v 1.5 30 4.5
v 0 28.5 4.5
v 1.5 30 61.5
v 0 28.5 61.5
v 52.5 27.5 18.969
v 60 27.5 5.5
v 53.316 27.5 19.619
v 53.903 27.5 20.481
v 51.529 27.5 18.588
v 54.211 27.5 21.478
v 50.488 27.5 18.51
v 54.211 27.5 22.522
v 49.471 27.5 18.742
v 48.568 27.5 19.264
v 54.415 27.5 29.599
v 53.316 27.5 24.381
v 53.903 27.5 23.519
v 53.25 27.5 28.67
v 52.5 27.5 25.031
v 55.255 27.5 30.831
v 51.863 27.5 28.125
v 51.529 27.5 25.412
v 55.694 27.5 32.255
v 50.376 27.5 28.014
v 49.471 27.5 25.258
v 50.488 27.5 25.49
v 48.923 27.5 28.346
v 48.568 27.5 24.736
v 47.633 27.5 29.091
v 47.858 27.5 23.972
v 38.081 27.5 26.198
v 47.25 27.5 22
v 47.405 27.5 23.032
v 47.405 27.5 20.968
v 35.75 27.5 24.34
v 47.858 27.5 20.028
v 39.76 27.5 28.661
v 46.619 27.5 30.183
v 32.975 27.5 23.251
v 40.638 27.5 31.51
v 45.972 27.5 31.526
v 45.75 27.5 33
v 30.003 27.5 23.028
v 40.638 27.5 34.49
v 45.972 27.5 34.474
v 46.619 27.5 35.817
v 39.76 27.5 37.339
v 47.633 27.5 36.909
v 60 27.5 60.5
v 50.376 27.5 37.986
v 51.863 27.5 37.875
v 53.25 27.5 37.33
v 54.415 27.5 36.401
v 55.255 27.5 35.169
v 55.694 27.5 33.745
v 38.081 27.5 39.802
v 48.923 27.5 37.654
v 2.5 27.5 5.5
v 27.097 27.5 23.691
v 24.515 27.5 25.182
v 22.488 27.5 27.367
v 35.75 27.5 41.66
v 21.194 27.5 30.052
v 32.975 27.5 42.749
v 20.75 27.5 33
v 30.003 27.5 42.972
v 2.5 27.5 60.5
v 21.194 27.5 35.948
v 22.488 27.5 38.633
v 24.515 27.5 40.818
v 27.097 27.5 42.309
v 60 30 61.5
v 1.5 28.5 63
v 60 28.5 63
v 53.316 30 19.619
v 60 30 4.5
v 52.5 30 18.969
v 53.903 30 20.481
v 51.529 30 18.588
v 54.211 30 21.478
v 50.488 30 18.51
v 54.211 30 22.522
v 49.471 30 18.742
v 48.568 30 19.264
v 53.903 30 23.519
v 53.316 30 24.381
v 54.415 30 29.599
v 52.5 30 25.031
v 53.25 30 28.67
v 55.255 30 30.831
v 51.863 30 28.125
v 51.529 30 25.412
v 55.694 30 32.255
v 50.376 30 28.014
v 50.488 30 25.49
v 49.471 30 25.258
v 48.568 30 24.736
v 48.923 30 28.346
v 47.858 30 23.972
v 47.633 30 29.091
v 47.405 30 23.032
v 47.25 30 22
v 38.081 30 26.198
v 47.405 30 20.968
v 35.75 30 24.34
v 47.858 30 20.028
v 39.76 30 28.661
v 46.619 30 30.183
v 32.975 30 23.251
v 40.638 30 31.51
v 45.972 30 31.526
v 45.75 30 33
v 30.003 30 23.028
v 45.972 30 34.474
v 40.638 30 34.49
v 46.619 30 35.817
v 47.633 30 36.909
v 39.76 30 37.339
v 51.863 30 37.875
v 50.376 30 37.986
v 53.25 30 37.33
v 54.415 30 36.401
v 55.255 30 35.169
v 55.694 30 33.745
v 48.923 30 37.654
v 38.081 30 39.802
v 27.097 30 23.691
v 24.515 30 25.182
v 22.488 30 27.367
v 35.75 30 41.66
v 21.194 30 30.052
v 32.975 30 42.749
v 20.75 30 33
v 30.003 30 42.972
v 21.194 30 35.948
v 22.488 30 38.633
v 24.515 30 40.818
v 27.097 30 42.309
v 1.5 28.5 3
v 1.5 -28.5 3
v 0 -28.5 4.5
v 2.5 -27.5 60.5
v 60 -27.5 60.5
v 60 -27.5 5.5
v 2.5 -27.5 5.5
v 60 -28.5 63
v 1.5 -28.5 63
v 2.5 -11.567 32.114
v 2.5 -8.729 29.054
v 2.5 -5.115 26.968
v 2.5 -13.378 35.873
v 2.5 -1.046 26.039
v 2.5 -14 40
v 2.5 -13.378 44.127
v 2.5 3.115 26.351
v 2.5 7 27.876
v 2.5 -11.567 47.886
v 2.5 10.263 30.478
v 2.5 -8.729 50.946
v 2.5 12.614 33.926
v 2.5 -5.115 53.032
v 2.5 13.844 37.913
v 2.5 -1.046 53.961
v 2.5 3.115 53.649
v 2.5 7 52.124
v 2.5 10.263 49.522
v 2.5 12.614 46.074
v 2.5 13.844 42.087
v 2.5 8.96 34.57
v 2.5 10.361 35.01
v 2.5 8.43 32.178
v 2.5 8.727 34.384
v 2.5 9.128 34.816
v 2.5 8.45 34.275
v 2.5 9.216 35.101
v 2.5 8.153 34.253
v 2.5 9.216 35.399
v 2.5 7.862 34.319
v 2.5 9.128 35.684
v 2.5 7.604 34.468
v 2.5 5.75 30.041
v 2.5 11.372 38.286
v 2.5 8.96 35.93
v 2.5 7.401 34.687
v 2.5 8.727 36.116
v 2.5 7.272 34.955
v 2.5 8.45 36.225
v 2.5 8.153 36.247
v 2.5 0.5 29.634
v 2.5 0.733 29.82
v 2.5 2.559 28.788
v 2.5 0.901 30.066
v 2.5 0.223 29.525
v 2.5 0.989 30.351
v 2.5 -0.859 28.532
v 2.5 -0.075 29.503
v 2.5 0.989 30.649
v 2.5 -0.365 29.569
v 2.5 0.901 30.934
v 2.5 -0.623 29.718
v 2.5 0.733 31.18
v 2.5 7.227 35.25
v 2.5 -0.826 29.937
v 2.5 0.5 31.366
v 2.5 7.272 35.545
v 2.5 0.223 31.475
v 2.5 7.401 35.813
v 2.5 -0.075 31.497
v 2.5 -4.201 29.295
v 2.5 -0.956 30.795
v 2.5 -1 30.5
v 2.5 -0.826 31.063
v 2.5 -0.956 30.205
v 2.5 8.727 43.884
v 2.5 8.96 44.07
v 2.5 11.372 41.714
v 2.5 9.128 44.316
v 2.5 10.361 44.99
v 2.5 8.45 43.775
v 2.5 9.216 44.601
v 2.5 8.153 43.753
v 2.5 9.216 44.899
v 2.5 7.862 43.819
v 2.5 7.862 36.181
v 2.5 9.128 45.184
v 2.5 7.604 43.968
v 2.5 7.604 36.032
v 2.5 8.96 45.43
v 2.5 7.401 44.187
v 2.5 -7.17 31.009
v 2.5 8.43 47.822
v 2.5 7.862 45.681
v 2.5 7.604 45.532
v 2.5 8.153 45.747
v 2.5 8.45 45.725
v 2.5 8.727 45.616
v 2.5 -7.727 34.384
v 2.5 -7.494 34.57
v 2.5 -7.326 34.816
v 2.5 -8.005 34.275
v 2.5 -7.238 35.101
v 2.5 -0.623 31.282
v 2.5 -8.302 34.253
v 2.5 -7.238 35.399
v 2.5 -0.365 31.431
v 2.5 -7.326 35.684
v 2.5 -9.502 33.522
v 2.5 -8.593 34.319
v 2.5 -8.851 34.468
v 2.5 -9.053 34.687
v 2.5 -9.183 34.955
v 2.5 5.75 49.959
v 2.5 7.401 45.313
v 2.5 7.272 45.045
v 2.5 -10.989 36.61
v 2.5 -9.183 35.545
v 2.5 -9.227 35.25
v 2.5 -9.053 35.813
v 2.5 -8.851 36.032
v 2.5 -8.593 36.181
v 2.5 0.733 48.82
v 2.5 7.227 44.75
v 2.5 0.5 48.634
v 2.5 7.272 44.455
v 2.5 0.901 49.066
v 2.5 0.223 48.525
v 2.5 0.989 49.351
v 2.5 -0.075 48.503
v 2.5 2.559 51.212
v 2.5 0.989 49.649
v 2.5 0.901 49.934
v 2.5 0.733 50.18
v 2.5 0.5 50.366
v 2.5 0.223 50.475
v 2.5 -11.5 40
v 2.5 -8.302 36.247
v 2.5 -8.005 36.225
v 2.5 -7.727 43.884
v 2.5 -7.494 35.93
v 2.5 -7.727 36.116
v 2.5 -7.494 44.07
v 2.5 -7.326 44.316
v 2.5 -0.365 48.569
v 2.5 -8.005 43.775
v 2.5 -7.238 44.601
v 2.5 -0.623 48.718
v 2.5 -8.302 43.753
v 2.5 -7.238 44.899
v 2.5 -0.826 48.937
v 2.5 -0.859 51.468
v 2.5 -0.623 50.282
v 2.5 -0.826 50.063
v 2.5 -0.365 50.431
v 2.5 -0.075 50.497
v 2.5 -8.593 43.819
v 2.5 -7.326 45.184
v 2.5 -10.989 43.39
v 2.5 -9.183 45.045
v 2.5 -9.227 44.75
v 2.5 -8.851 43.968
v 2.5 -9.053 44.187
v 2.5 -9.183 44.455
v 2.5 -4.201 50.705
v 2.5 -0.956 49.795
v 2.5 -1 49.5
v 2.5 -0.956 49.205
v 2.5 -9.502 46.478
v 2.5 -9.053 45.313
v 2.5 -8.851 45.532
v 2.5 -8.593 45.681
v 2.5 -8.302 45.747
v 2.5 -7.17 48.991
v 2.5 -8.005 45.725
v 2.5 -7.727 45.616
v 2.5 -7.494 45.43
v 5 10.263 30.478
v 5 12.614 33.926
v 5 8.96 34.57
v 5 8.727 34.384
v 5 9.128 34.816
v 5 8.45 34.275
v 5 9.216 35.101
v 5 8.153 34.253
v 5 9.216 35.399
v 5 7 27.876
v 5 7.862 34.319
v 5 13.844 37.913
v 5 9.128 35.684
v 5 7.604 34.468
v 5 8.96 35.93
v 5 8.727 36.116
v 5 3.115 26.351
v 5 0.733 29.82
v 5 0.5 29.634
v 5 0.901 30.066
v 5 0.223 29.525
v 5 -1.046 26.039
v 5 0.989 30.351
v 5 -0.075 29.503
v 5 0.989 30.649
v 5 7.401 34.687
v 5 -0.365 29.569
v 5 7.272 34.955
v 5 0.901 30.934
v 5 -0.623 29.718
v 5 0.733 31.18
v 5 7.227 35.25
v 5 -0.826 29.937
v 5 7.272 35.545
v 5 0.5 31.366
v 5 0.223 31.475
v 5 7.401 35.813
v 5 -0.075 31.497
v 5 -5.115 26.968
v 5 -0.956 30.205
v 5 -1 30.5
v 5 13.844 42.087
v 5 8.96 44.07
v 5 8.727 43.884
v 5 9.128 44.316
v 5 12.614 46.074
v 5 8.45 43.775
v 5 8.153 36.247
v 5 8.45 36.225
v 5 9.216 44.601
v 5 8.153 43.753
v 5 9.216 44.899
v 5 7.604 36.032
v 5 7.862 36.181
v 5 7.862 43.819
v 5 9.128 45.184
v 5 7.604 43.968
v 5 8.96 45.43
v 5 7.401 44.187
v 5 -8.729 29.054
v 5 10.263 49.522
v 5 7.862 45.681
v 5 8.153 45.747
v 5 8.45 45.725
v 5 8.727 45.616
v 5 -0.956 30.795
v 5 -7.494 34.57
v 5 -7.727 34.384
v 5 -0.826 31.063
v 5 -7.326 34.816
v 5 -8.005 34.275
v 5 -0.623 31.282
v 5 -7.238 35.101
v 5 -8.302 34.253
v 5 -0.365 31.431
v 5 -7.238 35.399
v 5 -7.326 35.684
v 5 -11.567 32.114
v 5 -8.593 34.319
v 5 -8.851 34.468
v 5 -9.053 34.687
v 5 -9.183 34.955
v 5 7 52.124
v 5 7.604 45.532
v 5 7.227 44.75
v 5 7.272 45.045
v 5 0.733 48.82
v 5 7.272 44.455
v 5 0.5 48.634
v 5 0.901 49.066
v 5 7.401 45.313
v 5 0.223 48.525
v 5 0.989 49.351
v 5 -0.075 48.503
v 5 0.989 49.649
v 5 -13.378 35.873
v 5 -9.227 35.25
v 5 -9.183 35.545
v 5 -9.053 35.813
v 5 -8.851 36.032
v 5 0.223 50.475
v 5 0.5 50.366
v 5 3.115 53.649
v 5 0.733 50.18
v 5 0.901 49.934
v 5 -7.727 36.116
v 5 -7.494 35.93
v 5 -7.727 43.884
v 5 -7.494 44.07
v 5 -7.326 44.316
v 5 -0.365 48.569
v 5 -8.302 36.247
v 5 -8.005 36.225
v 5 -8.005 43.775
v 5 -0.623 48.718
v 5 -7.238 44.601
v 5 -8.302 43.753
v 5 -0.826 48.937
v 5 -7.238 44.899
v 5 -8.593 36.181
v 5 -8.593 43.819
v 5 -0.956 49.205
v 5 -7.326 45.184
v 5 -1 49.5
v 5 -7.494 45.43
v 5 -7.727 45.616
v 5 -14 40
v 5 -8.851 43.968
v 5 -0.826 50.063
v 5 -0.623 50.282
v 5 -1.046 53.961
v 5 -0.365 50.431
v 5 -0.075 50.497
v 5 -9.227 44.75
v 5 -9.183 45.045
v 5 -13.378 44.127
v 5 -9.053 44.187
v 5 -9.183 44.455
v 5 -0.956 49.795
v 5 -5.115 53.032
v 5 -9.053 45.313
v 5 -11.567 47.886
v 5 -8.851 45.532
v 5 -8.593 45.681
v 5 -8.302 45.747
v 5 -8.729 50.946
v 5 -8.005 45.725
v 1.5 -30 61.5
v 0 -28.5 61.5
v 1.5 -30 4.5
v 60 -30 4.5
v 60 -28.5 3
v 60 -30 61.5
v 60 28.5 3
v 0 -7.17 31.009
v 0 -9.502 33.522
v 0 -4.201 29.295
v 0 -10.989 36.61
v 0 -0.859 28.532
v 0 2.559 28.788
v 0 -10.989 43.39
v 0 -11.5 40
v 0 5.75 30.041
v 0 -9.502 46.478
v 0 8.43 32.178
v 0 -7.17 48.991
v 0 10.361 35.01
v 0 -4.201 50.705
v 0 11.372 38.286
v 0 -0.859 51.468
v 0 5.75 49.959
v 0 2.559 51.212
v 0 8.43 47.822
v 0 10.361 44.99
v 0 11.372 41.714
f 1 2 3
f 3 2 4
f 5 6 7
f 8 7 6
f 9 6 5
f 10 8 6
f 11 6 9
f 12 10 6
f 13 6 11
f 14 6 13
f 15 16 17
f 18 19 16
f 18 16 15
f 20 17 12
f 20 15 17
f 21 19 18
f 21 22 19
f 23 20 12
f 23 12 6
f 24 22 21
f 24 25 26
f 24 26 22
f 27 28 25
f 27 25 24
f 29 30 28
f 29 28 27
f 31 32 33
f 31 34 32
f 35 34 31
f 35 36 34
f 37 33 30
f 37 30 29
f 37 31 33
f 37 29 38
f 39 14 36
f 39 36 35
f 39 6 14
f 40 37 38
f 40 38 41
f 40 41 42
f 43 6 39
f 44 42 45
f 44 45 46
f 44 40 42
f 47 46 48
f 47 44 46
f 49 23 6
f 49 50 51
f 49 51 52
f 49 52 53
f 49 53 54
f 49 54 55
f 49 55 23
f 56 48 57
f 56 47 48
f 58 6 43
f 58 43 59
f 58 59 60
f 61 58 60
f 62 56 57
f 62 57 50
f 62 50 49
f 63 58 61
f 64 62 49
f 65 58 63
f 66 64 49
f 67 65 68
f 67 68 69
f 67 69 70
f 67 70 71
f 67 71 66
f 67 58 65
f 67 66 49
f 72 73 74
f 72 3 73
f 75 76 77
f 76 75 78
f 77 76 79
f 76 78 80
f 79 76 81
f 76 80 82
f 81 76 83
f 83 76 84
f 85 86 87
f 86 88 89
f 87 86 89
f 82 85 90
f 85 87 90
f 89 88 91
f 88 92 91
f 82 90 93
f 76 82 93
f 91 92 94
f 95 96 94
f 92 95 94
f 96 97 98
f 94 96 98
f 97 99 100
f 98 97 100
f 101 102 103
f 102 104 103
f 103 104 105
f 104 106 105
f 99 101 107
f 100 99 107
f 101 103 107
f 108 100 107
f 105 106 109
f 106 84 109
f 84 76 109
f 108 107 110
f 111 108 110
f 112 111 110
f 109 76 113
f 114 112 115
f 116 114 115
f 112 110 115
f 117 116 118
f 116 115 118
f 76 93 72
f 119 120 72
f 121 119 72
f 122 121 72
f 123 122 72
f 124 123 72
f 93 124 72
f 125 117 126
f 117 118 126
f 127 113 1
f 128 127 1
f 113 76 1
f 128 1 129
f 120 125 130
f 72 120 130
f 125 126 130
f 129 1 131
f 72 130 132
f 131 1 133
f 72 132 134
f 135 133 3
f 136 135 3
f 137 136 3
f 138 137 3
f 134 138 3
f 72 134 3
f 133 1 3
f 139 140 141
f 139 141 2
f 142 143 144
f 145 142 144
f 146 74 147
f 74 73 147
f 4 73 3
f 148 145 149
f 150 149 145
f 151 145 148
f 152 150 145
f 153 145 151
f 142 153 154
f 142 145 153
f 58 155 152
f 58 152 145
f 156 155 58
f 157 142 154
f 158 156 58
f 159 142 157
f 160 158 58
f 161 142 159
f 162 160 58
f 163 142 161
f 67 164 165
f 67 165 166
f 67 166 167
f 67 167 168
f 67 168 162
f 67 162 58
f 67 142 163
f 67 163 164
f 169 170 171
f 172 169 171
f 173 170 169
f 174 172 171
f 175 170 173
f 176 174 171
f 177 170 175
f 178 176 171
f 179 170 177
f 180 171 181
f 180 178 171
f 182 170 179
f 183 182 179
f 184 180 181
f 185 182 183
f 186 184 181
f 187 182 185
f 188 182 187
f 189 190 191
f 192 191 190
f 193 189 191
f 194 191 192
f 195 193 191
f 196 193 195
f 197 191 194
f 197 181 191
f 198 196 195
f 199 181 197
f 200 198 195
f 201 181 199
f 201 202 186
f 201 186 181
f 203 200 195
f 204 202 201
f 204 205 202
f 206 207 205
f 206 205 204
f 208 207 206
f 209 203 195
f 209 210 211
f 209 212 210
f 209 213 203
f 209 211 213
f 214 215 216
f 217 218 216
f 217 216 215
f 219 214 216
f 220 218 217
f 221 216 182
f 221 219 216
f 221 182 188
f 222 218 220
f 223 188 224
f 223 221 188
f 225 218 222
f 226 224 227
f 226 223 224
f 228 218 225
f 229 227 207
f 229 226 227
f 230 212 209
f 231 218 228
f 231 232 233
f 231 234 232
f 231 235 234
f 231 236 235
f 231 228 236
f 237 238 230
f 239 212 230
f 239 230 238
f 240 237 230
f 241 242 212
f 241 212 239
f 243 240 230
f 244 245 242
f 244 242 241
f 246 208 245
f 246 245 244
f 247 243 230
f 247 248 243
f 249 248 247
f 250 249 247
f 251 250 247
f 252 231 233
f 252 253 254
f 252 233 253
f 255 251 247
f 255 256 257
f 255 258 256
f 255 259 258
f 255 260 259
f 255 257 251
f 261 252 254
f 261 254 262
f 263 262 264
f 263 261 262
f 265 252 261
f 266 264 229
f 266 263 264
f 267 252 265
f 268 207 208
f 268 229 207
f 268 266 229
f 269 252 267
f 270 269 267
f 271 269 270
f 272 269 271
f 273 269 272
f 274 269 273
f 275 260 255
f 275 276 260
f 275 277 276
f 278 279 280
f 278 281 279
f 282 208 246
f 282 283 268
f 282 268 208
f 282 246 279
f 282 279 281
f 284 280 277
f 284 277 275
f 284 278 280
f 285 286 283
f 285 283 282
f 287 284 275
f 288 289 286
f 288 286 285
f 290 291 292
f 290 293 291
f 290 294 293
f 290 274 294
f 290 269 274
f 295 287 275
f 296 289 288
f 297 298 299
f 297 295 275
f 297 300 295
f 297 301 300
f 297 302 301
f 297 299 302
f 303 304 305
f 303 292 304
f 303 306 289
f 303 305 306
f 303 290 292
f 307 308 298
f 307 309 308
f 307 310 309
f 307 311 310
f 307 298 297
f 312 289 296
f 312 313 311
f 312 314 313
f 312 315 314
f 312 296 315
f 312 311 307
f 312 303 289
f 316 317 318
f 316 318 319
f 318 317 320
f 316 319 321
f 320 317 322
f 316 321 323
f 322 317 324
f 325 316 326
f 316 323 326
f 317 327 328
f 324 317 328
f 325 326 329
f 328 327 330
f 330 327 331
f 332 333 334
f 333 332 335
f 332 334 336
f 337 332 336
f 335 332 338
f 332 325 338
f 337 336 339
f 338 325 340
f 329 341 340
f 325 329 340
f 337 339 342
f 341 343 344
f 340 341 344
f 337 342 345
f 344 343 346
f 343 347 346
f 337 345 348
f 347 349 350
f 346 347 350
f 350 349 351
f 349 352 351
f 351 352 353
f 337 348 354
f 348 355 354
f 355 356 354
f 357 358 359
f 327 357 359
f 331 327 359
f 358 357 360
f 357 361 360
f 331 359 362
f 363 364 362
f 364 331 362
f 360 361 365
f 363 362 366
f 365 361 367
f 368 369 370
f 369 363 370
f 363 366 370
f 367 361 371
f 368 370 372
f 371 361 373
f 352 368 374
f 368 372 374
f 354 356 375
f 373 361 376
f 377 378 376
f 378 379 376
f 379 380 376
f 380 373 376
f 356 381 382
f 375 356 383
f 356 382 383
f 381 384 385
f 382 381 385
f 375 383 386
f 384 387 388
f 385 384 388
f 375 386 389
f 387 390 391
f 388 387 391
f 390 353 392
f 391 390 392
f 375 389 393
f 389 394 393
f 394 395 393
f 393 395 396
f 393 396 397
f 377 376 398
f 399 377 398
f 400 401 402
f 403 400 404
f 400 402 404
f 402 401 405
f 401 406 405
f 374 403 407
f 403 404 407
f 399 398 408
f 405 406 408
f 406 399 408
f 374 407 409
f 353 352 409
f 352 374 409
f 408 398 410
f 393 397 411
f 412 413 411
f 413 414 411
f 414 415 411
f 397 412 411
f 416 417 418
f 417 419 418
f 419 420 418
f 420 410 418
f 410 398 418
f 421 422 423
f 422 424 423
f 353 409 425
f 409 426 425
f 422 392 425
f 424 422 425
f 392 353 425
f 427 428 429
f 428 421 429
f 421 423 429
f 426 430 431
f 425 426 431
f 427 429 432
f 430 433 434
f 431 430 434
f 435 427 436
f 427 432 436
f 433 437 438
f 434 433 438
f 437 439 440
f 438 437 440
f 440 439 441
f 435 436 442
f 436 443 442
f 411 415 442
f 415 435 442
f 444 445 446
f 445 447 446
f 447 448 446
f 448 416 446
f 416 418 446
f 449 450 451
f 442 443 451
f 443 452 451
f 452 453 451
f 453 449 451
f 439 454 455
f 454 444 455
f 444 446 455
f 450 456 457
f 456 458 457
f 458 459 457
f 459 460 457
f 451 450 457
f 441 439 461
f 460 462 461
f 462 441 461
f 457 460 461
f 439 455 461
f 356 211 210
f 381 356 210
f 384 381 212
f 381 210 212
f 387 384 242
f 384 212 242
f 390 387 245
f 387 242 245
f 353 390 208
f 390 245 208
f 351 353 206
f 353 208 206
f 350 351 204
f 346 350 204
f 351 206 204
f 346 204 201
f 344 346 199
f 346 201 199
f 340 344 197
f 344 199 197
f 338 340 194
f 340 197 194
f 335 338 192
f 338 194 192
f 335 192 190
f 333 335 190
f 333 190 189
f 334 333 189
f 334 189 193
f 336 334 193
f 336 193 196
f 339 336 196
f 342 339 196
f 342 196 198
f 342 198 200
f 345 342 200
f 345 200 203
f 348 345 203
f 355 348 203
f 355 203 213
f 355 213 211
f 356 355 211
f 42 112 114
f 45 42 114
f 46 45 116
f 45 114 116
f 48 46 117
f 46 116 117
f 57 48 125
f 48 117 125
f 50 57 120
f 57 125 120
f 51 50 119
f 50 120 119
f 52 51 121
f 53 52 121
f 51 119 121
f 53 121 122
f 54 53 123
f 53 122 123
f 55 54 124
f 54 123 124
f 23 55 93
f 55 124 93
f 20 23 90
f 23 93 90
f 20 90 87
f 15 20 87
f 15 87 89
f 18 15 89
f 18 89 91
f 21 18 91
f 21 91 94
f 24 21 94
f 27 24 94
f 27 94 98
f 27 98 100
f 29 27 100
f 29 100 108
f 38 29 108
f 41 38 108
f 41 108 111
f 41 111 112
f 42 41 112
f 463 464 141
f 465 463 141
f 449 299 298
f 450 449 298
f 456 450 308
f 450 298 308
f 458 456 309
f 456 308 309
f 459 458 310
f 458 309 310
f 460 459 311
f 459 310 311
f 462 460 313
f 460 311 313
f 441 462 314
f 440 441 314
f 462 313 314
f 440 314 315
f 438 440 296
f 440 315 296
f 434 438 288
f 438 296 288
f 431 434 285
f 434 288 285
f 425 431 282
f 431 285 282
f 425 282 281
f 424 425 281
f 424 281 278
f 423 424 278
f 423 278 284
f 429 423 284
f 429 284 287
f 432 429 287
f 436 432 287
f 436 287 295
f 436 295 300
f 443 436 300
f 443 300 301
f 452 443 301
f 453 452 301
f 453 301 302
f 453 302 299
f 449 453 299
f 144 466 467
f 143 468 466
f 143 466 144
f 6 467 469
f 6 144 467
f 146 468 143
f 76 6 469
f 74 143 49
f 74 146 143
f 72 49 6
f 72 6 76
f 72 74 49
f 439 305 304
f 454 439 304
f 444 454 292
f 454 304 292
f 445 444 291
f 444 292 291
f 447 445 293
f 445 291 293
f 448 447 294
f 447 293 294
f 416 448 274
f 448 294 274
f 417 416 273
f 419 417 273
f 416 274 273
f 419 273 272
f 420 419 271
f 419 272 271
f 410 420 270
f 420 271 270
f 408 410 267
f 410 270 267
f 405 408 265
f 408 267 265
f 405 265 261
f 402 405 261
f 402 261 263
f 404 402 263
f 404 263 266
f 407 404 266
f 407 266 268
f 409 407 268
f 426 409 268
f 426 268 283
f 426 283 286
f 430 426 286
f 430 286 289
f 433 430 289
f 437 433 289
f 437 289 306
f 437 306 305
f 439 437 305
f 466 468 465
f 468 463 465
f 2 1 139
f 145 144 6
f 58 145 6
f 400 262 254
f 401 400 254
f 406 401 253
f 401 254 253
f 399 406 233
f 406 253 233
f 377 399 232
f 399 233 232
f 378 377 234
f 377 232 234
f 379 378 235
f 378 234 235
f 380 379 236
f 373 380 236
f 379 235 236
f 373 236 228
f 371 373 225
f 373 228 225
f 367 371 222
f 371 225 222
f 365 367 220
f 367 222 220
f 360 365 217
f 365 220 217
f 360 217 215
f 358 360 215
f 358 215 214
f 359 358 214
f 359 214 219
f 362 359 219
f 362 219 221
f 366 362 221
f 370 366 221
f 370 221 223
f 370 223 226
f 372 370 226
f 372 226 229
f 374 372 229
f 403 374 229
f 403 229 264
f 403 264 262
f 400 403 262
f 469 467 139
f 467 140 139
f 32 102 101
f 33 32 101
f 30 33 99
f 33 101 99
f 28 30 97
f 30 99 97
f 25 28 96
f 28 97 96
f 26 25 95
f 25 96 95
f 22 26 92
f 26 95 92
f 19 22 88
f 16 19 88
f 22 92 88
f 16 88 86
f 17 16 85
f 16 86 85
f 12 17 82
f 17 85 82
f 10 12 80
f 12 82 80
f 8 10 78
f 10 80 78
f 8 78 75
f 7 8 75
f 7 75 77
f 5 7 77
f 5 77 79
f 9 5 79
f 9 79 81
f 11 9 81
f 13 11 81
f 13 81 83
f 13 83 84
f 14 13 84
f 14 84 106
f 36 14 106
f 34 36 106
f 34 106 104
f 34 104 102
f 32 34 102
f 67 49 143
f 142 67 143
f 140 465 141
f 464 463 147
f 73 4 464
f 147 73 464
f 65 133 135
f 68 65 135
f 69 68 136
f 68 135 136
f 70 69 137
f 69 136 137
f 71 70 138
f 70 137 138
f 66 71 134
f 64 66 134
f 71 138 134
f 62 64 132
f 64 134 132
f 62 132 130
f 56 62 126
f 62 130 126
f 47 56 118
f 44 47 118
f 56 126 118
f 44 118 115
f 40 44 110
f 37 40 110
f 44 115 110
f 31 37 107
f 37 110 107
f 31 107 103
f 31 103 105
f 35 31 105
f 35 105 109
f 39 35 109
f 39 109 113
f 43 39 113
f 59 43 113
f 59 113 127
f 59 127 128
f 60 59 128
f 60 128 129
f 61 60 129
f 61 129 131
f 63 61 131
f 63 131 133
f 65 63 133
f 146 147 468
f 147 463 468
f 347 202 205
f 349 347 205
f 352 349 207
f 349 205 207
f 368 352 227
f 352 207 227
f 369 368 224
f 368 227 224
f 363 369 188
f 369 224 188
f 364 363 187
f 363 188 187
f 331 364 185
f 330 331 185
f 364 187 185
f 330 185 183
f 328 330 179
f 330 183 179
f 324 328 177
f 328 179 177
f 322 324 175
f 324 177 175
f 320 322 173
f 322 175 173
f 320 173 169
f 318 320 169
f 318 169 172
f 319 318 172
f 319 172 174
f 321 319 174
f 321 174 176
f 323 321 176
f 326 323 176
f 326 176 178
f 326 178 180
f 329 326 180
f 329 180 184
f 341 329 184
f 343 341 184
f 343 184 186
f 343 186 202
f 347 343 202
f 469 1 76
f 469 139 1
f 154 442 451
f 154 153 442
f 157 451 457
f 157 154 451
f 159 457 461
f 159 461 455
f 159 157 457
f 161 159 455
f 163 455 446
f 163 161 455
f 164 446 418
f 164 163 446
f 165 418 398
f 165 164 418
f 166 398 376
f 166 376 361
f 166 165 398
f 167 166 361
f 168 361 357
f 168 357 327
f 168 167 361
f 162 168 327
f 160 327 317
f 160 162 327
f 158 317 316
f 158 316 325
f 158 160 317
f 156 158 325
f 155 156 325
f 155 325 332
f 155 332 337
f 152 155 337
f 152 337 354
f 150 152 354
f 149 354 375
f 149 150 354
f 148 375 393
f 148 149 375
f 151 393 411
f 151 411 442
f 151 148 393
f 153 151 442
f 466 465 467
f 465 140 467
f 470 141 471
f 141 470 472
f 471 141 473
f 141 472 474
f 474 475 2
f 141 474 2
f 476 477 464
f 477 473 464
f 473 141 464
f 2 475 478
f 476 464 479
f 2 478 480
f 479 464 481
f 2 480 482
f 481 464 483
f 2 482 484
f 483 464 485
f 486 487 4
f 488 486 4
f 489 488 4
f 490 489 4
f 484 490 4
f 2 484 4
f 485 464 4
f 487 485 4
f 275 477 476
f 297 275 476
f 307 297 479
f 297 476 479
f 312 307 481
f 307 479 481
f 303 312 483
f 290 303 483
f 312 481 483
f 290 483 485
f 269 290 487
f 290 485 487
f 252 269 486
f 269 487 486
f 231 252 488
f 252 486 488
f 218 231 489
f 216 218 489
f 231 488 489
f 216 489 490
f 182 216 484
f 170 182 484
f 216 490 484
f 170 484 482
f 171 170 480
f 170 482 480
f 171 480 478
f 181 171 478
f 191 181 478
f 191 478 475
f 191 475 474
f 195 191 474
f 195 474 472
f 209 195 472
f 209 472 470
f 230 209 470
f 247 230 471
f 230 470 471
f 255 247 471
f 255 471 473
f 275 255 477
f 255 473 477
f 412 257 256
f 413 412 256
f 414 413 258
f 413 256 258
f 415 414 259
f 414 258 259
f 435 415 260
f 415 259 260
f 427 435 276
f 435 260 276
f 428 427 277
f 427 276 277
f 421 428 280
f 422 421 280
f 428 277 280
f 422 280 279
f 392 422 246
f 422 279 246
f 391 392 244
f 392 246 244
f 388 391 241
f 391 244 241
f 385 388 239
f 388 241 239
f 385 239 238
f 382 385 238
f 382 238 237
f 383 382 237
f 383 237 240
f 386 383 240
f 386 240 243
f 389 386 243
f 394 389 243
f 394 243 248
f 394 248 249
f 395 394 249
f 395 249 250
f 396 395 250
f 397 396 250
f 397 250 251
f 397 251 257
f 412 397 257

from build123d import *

# Parameters (mm, degrees)
F1_DEPTH = 60
F2_R     = 11.5
F3_DEPTH = 2.5
F5_T     = -2.5
F4_R     = 1
F6_DEPTH = 25
F7_SIZE  = 1.5
F8_R     = 3.5
F8_R_2   = 5
F8_R_3   = 10
F9_DEPTH = 3


with BuildPart() as f1:
    # F0 (on Right) → F1 (new body)
    with BuildSketch(Plane.YZ):
        Polygon((30, 63), (-30, 63), (-30, 3), (0, 3), (30, 3), align=None)
    extrude(amount=F1_DEPTH)

    # F2 (on face) → F3 (cut)
    with BuildSketch(Plane(origin=(0, 0, 0), x_dir=(0, -1, 0), z_dir=(-1, 0, 0))):
        with Locations((0, 40)):
            Circle(F2_R)
    extrude(amount=-F3_DEPTH, mode=Mode.SUBTRACT)

    # F5
    f5_openings = [f1.faces().sort_by_distance(p)[0] for p in [
        (60, 0, 33),
    ]]
    offset(amount=F5_T, openings=f5_openings, kind=Kind.INTERSECTION)

    # F4 (on face) → F6 (cut)
    with BuildSketch(Plane(origin=(0, 0, 0), x_dir=(0, -1, 0), z_dir=(-1, 0, 0))):
        with Locations((0, 49.5)):
            Circle(F4_R)
        with Locations((-8.227241336, 44.75)):
            Circle(F4_R)
        with Locations((-8.227241336, 35.25)):
            Circle(F4_R)
        with Locations((0, 30.5)):
            Circle(F4_R)
        with Locations((8.227241336, 35.25)):
            Circle(F4_R)
        with Locations((8.227241336, 44.75)):
            Circle(F4_R)
    extrude(amount=-F6_DEPTH, mode=Mode.SUBTRACT)

    # F7
    f7_edges = [f1.edges().sort_by_distance(p)[0] for p in [
        (30, -30, 63),
        (30, 30, 63),
        (30, 30, 3),
        (30, -30, 3),
        (0, -30, 33),
        (0, 0, 63),
        (0, 30, 33),
        (0, 0, 3),
    ]]
    chamfer(f7_edges, length=F7_SIZE)

    # F8 (on face) → F9 (cut)
    with BuildSketch(Plane(origin=(0, 30, 0), x_dir=(-1, 0, 0), z_dir=(0, 1, 0))):
        with Locations((-50.75, 22)):
            Circle(F8_R)
        with Locations((-50.75, 33)):
            Circle(F8_R_2)
        with Locations((-30.75, 33)):
            Circle(F8_R_3)
    extrude(amount=-F9_DEPTH, mode=Mode.SUBTRACT)


solid = f1.part
